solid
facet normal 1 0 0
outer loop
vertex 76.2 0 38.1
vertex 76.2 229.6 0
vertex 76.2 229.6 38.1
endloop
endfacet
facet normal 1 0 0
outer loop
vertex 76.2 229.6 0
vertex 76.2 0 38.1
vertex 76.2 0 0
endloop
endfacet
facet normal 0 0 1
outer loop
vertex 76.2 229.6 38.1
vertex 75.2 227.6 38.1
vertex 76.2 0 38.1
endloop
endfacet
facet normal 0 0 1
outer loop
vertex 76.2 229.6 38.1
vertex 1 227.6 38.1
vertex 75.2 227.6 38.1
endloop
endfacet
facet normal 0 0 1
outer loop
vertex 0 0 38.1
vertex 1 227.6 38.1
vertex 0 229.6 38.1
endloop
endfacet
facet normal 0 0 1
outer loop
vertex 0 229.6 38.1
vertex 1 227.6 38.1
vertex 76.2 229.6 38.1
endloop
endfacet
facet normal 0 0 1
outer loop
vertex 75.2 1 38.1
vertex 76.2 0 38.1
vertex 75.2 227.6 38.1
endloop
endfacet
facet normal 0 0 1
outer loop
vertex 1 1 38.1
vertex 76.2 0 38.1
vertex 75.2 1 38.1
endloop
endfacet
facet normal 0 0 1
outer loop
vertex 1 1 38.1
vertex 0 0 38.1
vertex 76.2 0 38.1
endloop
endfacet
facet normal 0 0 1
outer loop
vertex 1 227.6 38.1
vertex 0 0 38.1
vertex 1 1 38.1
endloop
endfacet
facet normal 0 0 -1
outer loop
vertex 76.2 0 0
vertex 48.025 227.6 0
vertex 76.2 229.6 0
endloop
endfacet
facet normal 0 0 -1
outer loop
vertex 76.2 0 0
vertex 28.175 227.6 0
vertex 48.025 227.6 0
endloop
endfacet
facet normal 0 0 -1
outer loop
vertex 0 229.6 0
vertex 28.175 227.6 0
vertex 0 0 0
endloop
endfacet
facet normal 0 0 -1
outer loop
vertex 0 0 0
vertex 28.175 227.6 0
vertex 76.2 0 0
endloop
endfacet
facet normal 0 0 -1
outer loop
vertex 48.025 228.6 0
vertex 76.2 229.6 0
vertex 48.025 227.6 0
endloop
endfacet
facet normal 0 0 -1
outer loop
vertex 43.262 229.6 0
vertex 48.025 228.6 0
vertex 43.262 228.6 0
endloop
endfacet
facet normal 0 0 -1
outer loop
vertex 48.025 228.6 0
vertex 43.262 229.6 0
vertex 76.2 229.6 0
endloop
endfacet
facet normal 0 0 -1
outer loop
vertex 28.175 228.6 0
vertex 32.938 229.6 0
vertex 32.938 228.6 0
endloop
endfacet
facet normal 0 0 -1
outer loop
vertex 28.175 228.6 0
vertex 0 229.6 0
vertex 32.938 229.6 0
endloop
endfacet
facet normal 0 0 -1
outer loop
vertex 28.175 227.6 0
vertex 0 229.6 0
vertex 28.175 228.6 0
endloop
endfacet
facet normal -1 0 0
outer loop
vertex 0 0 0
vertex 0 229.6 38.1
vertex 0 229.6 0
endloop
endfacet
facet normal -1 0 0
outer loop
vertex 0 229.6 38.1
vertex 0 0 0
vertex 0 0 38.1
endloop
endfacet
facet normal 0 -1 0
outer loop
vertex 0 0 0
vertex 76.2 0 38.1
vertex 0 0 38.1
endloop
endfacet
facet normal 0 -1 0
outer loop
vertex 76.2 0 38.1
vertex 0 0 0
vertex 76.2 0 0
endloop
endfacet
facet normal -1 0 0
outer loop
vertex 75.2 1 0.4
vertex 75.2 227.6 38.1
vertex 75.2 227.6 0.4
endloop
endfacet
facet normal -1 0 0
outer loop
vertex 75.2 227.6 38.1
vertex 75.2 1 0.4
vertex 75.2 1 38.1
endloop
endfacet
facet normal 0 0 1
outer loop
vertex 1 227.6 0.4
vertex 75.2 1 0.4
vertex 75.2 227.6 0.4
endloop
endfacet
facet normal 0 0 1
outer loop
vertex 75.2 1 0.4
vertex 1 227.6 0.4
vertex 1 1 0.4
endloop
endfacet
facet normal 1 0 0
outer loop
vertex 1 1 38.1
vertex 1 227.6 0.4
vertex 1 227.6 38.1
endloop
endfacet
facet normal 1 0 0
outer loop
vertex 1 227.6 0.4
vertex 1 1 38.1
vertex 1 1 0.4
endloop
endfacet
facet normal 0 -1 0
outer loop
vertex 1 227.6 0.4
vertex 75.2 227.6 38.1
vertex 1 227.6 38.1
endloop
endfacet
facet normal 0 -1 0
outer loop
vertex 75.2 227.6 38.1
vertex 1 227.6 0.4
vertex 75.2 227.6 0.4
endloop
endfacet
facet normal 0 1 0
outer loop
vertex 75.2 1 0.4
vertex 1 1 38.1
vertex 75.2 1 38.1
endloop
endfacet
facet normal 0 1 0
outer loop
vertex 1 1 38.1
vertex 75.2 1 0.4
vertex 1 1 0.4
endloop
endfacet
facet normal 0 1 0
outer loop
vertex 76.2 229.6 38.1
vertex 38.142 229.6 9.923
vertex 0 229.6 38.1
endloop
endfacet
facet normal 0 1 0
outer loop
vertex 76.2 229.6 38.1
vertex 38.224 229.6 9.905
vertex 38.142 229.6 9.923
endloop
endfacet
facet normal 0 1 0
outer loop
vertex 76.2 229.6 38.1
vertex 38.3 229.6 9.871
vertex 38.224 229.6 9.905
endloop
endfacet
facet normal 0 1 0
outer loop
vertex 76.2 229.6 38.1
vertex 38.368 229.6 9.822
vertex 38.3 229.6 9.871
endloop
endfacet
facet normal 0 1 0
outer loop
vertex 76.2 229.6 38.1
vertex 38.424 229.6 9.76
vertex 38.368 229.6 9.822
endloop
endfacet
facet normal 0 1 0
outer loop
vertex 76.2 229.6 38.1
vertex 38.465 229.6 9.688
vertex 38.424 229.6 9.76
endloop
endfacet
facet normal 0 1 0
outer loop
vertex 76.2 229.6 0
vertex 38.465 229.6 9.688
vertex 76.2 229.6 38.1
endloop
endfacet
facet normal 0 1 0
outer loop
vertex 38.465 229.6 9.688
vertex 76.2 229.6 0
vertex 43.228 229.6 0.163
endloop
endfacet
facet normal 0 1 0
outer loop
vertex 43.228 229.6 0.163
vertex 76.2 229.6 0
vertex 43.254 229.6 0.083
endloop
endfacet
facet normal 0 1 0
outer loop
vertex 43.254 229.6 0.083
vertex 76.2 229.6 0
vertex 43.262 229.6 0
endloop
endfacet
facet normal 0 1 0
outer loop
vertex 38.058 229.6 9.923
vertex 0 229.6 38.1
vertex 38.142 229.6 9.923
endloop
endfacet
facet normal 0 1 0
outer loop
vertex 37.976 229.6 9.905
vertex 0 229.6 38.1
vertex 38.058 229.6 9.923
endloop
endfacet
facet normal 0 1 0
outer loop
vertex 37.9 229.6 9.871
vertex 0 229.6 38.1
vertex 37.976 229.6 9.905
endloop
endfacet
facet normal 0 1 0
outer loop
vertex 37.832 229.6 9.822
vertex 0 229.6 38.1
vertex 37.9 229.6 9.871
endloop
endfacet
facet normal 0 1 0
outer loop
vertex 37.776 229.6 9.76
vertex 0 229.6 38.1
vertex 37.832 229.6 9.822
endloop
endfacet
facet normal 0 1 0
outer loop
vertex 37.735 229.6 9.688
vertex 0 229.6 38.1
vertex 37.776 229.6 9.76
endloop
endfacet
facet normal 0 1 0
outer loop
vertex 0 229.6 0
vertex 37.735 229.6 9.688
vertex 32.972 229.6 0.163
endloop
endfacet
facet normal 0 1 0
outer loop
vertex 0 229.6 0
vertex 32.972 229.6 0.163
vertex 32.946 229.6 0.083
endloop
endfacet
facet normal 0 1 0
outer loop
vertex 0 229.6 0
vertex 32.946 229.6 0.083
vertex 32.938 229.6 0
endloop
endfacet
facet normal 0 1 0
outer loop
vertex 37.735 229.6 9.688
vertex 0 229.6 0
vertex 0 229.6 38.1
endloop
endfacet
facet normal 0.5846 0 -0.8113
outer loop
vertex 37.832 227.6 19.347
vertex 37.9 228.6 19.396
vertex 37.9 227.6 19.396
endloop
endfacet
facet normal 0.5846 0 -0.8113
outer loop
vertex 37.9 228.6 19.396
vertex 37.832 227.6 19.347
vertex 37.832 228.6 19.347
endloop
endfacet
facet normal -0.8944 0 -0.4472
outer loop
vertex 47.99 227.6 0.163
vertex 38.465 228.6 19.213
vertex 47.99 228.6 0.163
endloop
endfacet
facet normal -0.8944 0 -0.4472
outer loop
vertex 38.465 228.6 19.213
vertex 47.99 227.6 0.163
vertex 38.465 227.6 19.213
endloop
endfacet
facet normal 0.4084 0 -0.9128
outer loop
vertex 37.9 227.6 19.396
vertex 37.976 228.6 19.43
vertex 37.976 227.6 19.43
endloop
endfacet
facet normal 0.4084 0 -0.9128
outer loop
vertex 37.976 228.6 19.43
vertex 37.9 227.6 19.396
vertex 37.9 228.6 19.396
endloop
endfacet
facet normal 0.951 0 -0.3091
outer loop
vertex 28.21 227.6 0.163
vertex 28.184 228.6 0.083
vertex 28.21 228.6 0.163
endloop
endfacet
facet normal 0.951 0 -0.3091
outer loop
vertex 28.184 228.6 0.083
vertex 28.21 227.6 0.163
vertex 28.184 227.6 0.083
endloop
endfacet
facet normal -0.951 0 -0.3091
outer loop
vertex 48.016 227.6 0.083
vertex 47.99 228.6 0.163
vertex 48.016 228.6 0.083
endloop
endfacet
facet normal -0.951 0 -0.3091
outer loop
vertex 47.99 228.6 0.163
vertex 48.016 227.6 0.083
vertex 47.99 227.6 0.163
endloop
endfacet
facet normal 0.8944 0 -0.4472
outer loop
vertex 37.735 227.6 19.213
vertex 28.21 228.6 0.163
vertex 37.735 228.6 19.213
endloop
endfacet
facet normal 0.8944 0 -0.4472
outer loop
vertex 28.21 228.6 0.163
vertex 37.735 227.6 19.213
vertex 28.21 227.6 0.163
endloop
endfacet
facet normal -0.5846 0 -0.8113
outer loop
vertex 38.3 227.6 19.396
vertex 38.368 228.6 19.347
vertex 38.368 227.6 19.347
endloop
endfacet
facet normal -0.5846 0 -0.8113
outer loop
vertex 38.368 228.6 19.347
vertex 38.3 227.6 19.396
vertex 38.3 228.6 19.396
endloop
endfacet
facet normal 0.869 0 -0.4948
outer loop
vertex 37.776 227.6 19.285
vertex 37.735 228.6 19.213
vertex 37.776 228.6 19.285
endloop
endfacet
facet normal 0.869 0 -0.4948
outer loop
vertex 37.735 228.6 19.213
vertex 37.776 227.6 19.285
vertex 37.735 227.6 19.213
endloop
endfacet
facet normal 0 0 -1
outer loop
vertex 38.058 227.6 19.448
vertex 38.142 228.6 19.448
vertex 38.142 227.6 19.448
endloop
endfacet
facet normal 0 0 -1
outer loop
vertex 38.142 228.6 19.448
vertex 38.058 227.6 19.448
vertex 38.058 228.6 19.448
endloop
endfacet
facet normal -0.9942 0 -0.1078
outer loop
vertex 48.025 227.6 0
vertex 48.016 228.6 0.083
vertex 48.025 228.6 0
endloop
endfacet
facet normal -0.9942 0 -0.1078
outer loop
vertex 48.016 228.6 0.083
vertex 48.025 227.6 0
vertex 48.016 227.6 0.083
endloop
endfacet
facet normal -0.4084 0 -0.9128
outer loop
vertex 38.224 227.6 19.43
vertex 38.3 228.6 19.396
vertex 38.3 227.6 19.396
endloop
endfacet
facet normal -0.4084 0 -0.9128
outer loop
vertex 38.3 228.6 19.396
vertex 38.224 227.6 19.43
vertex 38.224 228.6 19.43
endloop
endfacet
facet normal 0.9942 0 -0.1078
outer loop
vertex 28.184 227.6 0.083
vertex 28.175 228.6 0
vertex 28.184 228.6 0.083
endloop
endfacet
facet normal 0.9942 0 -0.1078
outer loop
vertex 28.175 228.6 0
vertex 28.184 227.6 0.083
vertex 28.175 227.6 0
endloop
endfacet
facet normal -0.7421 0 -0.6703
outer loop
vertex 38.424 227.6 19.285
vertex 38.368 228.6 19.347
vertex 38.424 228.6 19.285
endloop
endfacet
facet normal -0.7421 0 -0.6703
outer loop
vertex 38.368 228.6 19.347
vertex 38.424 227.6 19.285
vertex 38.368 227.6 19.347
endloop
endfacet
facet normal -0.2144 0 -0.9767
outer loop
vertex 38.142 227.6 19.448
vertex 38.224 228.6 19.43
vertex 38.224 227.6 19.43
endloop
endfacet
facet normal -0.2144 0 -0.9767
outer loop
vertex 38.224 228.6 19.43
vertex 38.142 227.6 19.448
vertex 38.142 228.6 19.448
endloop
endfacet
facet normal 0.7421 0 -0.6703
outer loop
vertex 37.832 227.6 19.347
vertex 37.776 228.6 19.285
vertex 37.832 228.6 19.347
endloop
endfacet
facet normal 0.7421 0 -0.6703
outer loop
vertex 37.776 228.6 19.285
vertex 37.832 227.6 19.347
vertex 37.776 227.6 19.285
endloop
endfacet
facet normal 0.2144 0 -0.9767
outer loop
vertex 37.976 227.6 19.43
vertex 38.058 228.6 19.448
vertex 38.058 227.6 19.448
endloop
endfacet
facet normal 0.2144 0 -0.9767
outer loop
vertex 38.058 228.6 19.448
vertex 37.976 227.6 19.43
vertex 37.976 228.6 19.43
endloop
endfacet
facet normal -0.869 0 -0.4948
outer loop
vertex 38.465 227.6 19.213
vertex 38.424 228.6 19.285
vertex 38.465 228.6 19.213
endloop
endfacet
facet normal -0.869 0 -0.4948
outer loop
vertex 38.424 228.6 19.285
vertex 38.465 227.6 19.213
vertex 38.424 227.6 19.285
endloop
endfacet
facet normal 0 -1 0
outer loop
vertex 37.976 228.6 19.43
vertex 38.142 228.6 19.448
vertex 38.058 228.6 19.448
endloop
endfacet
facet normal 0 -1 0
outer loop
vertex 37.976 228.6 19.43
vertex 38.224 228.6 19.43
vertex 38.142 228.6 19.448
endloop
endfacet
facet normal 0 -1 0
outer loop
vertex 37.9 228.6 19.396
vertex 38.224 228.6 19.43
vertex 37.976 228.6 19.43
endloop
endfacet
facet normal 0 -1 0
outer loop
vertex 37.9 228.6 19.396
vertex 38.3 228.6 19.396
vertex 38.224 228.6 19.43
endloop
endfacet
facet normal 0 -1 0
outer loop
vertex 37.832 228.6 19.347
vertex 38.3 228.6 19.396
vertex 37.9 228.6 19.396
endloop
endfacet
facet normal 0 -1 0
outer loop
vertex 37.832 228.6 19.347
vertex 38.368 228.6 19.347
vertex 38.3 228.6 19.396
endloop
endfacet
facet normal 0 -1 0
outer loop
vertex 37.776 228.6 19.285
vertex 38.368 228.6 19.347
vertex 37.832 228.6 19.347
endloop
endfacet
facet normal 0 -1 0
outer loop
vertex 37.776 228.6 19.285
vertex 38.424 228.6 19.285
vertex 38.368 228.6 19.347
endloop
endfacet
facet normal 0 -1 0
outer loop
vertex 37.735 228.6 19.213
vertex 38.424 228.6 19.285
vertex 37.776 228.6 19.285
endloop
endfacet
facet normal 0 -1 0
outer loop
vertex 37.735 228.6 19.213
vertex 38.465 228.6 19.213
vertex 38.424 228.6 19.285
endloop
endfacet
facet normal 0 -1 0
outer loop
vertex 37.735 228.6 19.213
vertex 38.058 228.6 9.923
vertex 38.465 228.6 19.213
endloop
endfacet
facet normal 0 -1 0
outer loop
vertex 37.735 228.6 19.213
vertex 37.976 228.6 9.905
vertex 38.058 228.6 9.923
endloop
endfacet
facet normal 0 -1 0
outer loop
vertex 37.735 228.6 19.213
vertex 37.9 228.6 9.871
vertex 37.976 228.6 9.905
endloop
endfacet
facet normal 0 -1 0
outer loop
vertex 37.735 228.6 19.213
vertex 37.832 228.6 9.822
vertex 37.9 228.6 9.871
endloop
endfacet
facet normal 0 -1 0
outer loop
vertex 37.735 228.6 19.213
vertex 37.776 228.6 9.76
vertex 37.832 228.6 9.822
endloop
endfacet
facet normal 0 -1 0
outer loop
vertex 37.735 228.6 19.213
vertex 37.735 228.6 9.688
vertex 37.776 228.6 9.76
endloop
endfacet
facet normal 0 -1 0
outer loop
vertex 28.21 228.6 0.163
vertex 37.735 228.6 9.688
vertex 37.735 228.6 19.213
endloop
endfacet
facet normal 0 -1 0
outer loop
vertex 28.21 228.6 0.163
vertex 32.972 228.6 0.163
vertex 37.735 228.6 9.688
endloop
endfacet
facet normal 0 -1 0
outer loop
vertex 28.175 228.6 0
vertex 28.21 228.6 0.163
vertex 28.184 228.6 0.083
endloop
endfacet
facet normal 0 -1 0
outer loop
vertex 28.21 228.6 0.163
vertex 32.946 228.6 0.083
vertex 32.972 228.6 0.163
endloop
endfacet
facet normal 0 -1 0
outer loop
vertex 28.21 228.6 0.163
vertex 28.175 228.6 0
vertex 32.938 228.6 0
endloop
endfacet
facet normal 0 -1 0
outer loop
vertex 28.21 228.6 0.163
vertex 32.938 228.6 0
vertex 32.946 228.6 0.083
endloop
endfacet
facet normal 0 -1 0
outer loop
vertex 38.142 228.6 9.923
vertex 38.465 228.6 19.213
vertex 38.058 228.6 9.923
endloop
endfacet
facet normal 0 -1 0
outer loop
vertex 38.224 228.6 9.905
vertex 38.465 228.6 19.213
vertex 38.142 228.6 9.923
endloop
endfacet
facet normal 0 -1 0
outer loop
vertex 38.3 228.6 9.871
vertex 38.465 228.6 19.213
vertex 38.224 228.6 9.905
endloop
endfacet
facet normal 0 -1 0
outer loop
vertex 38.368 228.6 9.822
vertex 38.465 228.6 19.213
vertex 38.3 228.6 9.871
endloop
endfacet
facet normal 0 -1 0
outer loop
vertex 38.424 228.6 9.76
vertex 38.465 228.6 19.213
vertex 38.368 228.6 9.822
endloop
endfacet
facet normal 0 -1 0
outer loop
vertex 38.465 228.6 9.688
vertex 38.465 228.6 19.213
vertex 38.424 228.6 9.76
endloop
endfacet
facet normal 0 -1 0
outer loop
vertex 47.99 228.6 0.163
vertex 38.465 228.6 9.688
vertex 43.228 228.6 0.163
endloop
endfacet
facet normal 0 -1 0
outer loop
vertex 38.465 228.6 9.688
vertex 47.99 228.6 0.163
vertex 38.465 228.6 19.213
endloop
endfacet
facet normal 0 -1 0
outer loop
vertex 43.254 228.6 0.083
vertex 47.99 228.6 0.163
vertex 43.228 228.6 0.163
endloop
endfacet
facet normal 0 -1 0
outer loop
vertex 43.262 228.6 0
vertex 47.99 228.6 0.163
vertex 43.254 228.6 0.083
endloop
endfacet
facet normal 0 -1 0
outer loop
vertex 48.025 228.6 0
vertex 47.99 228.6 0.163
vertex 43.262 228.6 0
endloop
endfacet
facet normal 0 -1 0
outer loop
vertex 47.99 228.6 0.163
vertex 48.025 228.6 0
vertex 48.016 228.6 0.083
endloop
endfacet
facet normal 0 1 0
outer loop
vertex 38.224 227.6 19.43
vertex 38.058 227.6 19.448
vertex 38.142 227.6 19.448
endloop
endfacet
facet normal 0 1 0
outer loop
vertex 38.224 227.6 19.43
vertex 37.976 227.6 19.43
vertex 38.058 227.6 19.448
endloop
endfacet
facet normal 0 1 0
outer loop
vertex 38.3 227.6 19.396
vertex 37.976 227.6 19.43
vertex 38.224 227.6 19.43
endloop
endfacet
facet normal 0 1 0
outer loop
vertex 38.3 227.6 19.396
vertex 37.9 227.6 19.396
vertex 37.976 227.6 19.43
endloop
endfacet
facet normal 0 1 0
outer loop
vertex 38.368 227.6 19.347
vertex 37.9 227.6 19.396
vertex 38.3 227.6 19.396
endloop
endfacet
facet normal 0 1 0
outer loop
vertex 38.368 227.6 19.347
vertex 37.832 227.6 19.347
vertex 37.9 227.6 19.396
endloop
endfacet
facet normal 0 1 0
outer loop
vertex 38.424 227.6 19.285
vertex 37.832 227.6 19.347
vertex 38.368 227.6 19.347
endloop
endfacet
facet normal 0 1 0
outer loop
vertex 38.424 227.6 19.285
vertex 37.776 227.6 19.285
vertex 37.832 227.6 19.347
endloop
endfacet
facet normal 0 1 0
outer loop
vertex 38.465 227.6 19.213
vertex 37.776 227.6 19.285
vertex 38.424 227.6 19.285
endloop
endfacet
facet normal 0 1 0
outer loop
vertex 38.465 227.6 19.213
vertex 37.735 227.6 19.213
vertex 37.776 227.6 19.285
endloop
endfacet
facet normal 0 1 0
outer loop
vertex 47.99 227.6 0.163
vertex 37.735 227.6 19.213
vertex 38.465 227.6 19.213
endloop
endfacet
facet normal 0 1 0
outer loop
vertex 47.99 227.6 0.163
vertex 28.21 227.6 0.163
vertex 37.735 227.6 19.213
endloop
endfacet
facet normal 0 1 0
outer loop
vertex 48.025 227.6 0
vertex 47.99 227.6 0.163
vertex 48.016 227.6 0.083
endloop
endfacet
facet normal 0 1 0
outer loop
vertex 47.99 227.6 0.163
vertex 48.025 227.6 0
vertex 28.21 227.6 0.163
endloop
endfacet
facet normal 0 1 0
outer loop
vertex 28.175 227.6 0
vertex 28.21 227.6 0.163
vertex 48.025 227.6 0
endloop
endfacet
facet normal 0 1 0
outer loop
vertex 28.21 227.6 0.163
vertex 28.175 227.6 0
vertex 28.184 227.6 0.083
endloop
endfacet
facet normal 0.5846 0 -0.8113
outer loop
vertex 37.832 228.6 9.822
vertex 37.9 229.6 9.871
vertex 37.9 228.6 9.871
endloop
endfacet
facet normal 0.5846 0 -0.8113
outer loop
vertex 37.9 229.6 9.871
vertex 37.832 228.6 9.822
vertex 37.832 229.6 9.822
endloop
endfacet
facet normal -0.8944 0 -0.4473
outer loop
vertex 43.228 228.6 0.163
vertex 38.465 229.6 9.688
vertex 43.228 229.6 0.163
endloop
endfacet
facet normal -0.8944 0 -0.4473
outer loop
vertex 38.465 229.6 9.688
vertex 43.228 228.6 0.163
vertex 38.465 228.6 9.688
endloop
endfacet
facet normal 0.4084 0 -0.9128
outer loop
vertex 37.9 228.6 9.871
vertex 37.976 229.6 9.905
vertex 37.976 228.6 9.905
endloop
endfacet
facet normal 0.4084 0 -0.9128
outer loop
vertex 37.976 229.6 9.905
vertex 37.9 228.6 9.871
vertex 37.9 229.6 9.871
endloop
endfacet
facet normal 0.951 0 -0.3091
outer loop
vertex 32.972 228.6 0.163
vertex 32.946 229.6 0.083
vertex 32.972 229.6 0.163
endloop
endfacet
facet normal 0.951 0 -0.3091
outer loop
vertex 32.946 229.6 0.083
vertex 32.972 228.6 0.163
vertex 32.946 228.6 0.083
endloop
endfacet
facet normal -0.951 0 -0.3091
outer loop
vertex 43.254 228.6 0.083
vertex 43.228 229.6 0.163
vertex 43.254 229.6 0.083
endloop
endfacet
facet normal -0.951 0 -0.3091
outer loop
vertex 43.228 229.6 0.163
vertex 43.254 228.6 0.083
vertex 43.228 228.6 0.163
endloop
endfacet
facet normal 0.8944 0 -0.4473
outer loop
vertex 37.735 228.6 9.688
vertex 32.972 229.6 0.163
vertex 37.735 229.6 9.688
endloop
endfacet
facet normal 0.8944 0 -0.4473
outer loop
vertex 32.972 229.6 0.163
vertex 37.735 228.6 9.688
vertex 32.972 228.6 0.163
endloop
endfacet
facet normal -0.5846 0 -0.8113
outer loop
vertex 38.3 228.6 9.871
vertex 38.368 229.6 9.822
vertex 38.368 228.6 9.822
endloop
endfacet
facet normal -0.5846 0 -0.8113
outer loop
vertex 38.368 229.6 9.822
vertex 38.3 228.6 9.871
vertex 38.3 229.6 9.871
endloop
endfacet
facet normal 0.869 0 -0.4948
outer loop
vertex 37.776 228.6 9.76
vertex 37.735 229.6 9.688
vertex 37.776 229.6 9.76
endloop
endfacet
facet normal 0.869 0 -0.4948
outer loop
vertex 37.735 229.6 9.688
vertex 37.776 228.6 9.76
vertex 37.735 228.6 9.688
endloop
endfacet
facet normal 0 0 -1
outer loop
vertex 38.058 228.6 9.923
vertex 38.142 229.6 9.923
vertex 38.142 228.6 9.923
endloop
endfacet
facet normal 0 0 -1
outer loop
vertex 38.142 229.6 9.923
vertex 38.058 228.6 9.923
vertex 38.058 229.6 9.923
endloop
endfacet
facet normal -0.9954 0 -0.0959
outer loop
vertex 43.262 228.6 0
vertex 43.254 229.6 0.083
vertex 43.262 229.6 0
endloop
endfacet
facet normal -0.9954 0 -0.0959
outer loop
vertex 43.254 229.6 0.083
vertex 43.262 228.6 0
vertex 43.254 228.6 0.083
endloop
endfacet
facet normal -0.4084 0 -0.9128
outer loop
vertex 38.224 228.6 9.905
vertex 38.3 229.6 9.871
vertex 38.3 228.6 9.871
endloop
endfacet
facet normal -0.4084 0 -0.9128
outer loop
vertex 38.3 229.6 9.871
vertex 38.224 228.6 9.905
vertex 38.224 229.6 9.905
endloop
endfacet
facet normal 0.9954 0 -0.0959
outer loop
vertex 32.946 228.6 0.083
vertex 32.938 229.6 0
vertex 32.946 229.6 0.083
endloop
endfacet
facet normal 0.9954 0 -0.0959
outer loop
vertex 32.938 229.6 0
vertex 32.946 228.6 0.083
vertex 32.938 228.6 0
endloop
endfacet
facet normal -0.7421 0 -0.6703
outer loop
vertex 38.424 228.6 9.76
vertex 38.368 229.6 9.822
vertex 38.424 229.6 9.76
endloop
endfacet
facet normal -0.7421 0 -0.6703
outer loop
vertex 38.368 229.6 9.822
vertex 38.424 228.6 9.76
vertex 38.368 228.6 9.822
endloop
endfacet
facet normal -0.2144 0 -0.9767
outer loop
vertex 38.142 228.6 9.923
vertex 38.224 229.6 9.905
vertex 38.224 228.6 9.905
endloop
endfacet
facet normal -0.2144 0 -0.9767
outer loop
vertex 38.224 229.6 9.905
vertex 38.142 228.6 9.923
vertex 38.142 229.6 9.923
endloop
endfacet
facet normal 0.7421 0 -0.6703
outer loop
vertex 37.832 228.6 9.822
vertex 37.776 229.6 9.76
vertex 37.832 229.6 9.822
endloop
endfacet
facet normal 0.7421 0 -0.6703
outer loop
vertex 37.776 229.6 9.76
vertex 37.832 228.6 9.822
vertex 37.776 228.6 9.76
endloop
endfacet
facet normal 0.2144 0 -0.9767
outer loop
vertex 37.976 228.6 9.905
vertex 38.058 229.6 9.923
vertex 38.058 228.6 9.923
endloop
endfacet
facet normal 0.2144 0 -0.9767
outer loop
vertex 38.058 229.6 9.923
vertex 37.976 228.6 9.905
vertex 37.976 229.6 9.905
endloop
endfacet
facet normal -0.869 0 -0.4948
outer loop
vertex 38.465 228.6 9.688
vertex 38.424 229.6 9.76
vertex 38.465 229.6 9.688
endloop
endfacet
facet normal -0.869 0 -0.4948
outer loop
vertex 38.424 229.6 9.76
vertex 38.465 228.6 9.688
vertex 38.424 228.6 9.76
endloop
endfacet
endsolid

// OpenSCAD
// file: ../../common/triangle.scad
// Please see https://www.triangle-calculator.com/

function equilateral_triangle(width, height, center=false) = [
    [center ? -0.5 * width : 0, 0],
    [center ? 0.5 * width : width, 0],
    [center ? 0 : 0.5 * width, height]
];
// file: ../bin.scad
module bin(width, depth, height, wall_thickness, floor_thickness) {
    difference() {
        cube([width, depth, height]);
        translate([
            wall_thickness, wall_thickness, floor_thickness
        ]) cube([
            width - 2 * wall_thickness,
            depth - 2 * wall_thickness,
            height - floor_thickness
        ]);
    }
}
// main file
use <../bin.scad>
use <../../common/triangle.scad>

// 1 inch = 25.4 mm

// Build plate dimensions (250x210x220) require two pieces... they'll be joined
// by an overlapping wall lock

$fn = 30;

width = 3 * 25.4;
depth = 9 * 25.4;
height = 1.5 * 25.4;

connector_buffer = 0.4;

module main_bin() {
    bin(
        width,
        depth,
        height,
        1,
        0.4
    );
}

module main_bin_with_additional_wall_material() {
    union(){
        main_bin();
        translate([0, depth, 0]) cube([width, 1, height]);
    }
}

module connection_male() {
    union() {
        translate([0, 1, 0]) rotate([90, 0, 0]) linear_extrude(1) polygon(equilateral_triangle(width / 4, height / 2, center=true));
        translate([0, 2, 0]) rotate([90, 0, 0]) linear_extrude(1) polygon(equilateral_triangle(width / 8, height / 4, center=true));
    }
}

module connection_female() {
    module add_wiggle_room() {
        minkowski() {
            children();
            cylinder(r=connector_buffer, h=0.5, center=false);
        }
    }

    union() {
        translate([0, 1, 0]) rotate([90, 0, 0]) add_wiggle_room() linear_extrude(0.5) polygon(equilateral_triangle(width / 4, height / 2, center=true));
        translate([0, 2, 0]) rotate([90, 0, 0]) add_wiggle_room() linear_extrude(0.5) polygon(equilateral_triangle(width / 8, height / 4, center=true));
    }
}

module main_bin_complete() {
    difference() {
        main_bin_with_additional_wall_material();
        translate([width/2, depth-1, 0]) connection_female();
    }
}

main_bin_complete();
